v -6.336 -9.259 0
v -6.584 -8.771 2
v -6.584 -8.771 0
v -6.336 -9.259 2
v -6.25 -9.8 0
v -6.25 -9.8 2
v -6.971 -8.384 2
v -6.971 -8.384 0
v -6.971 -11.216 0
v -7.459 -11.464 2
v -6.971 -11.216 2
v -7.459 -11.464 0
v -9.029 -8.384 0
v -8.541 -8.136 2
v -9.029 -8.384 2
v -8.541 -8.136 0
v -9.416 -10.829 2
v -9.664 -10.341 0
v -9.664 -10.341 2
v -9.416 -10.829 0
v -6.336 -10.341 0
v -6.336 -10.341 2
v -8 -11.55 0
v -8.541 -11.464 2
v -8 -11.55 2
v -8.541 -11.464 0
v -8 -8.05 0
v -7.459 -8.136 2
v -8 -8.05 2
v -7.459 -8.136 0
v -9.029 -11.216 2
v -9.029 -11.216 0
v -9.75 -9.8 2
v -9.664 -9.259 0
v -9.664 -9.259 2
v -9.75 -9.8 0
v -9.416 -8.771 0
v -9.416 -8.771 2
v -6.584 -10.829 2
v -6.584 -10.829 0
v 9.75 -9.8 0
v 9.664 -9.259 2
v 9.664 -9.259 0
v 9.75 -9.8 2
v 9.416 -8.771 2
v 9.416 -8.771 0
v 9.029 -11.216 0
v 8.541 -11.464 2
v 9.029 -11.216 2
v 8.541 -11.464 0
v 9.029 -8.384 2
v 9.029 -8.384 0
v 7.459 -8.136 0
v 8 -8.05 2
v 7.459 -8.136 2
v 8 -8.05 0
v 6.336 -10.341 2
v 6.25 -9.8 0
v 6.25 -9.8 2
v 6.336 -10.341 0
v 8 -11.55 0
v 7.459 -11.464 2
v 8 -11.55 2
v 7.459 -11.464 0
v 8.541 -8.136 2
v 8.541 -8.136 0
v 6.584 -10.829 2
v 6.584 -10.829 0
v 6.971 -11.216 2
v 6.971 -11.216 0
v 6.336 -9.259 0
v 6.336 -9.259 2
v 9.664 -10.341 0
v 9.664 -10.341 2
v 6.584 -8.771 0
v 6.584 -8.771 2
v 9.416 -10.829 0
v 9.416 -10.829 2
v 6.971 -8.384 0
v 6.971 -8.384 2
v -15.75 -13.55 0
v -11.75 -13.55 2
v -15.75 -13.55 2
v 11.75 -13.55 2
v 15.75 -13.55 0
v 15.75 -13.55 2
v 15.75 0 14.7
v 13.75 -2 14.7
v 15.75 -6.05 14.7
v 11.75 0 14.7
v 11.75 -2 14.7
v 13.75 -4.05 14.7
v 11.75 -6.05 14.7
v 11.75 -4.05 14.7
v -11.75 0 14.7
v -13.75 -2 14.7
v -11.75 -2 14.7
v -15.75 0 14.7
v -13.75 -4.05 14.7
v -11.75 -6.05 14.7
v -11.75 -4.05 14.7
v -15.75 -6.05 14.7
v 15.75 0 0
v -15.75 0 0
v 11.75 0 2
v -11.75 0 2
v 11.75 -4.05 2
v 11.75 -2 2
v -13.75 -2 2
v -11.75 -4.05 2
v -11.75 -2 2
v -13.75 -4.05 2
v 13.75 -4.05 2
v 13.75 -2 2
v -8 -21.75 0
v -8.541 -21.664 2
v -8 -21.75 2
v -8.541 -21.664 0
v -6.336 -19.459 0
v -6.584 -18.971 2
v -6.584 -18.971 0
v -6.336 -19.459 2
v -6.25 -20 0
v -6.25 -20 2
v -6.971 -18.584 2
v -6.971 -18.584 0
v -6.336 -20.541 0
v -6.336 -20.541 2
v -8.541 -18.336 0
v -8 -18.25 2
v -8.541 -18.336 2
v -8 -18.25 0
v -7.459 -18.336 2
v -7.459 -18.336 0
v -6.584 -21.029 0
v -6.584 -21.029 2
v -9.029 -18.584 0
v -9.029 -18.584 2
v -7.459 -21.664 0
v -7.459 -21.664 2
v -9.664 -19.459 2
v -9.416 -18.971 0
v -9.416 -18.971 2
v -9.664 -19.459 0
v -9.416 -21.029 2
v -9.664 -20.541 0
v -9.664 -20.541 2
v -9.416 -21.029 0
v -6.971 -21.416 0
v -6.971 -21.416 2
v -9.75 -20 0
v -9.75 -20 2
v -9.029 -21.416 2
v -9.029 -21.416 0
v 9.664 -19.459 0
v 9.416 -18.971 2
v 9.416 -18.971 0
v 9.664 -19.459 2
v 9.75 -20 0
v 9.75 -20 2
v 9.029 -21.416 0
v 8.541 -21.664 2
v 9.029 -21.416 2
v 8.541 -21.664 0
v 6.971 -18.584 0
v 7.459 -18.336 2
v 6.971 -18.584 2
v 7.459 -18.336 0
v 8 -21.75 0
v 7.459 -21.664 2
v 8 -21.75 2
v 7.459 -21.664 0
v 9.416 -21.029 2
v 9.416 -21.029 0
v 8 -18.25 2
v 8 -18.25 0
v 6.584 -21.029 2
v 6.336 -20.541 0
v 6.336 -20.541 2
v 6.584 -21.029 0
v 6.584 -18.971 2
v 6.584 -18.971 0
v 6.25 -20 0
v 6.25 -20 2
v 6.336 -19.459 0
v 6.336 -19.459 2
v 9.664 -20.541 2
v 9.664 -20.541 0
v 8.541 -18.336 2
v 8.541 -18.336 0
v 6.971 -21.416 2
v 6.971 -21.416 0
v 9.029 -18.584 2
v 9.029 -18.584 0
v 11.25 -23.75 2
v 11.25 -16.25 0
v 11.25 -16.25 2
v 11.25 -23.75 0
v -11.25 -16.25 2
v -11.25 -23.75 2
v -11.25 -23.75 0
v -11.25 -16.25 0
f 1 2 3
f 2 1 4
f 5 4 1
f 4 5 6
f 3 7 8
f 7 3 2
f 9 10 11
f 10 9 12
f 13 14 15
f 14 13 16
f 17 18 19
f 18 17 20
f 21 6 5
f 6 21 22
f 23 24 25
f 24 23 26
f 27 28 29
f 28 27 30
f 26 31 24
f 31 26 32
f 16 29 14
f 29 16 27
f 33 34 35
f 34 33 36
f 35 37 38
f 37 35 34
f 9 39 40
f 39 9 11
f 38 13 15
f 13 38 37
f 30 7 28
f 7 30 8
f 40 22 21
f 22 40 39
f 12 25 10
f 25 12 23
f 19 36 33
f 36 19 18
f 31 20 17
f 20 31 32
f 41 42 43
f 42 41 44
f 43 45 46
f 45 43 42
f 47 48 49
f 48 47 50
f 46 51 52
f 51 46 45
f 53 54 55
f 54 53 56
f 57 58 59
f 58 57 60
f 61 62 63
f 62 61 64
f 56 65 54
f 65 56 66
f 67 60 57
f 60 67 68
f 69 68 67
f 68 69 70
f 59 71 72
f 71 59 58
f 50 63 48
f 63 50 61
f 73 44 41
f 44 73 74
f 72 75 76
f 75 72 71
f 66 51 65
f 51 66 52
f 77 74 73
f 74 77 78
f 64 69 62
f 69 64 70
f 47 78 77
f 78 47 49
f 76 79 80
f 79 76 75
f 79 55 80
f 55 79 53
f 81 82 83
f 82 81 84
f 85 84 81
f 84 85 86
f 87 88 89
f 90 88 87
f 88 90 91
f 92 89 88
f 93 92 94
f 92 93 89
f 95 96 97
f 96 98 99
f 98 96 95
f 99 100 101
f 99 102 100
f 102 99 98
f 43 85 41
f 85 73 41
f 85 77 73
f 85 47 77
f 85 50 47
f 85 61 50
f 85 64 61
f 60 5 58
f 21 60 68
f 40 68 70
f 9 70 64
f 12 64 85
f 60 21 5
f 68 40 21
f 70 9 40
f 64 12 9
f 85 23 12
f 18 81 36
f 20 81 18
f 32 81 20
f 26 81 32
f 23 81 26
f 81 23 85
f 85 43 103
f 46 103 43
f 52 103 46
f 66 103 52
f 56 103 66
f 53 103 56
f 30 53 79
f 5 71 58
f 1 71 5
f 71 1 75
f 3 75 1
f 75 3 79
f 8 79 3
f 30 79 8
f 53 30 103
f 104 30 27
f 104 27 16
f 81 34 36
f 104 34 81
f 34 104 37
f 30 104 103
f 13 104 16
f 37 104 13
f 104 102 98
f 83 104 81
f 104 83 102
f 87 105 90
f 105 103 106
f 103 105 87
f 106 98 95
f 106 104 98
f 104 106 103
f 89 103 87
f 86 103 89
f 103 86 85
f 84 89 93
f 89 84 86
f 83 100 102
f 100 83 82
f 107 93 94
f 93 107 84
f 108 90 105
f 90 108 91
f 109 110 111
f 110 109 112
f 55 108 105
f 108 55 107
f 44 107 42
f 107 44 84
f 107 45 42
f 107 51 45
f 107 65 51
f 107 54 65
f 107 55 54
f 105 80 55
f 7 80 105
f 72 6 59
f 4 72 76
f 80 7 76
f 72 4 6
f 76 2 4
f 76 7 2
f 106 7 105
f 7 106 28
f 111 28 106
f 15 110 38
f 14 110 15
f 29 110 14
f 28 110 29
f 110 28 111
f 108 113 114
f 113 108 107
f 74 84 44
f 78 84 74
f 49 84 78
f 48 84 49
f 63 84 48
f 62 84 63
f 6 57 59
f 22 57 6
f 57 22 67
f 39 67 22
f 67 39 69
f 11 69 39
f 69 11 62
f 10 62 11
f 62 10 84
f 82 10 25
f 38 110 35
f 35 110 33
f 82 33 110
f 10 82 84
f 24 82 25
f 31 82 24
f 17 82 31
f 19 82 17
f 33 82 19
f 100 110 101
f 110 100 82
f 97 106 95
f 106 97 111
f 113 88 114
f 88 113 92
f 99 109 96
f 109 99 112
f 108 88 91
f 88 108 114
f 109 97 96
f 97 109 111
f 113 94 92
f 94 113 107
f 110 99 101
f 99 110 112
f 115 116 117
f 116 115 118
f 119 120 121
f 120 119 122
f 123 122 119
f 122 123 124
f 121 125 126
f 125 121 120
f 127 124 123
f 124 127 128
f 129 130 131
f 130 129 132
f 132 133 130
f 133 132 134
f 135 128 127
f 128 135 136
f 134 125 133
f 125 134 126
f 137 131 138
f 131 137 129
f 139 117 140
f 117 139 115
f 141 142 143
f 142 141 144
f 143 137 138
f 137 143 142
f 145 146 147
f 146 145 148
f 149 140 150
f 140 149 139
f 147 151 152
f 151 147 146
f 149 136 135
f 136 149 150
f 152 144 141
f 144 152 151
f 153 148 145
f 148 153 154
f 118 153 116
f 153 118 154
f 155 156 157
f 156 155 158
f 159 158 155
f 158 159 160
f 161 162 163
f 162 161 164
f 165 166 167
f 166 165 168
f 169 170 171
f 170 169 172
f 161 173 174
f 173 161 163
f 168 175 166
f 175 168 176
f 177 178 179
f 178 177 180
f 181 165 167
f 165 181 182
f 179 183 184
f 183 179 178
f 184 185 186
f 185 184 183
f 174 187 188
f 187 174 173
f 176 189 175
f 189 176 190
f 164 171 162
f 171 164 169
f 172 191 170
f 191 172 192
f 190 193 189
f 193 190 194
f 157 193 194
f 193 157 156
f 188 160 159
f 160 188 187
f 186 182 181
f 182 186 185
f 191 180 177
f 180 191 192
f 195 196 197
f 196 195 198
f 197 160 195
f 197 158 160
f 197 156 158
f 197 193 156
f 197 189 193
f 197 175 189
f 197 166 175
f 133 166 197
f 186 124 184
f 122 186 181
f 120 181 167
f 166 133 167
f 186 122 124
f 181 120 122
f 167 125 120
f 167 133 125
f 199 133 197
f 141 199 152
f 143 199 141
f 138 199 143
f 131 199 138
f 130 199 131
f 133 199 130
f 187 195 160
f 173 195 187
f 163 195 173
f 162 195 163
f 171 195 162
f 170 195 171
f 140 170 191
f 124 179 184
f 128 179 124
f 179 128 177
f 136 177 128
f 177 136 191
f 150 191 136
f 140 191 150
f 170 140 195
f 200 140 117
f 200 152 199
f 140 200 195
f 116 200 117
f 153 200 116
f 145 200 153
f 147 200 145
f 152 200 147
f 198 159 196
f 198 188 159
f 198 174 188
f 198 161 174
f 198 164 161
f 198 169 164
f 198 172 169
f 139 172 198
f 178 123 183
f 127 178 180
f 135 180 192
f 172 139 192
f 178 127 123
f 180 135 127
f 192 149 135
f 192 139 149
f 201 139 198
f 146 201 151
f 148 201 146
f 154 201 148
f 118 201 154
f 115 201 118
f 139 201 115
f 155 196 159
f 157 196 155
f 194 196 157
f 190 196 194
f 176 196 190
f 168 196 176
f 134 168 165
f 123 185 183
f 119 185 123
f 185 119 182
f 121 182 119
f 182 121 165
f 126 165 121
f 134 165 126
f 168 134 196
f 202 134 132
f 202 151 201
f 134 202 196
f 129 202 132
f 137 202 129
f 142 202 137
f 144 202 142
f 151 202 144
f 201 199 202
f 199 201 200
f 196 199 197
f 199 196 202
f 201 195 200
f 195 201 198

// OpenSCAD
/*
 * Vertical PCB Mounting Bracket
 *
 * by Alex Franke (CodeCreations), Oct 2012
 * http://www.theFrankes.com
 * 
 * Licenced under Creative Commons Attribution - Non-Commercial - Share Alike 3.0 
 * 
 * DESCRIPTION: This little bracket provides an easy way to mount a PCB vertically. It includes
 *   a small wire clamp that can be used to hold PCB wires in place. I use it to hold a small 1"  
 *   by 0.5" PCB that has a bank of header pins for X, Y, Z, and E motors. 
 * 
 * INSTRUCTIONS: Set User-defined values, render, and print. Insert the PCB in the channel and 
 *   route the wires between the mounting holes. Place the wire clamp on top and mount using the 
 *   holes. You may need to tweak the values a bit for a snug fit. 
 * 
 * THING: http://www.thingiverse.com/thing:34308
 * 
 * v1.00, Jun 15, 2012: Initial version. 
 *
 */

/////////////////////////////////////////////////////////////////////////////
// User-defined values... 
/////////////////////////////////////////////////////////////////////////////

// Describe the PCB 
boardWidth       = 27.5;  // Width of the PCB or board to hold
boardThickness   = 2.05;  // Thickness of the PCB or board to hold
clipHeight       = 12.7;  // The height of the PCB or board to hold 

// Describe the bracket 
thickness        = 2;     // The thickness of the material surrounding the board 
baseThickness    = 2;     // The thickness of the base 
supportWidth     = 4;     // The overall width of the support risers
holeDiameter     = 3.5;   // The diameter of the holes 
holePadding      = 2;     // The distance between the edge of the hole other edges or walls

// Describe the wire clamp 
includeWireClamp = true;  // Whether or not to include the wire clamp 
play             = 1;     // The amount of play in the wire clamp

// Other parameters 
$fn              = 20;    // General circle quality. 


/////////////////////////////////////////////////////////////////////////////
// Some calculated values... 
/////////////////////////////////////////////////////////////////////////////

overallSize = [	boardWidth+thickness*2, 
				boardThickness+thickness*2+holeDiameter+holePadding*2, 
				baseThickness+clipHeight];

X=0;
Y=1;
Z=2;

/////////////////////////////////////////////////////////////////////////////
// The code... 
/////////////////////////////////////////////////////////////////////////////

difference() {
	translate([overallSize[X]/2,0,0]) 
		rotate([90,0,-90]) 
			linear_extrude(height=overallSize[X])
				polygon(points=[
					[0,0],
					[0,overallSize[Z]],
					[boardThickness+thickness*2,overallSize[Z]],
					[overallSize[1],baseThickness],
					[overallSize[1],0],
					[0,0]
				]);

	translate([0,-overallSize[Y]/2,overallSize[Z]/2+baseThickness])
		cube([overallSize[X]-supportWidth*2,overallSize[Y]+1,overallSize[Z]], center=true);

	translate([0,-boardThickness/2-thickness,clipHeight/2+baseThickness+0.5]) 
		cube([boardWidth,boardThickness,clipHeight+1], center=true);

	for(i=[-1,1]) 
		translate([	i*(overallSize[X]/2-supportWidth-holePadding-holeDiameter/2),
					-boardThickness-thickness*2-holePadding-holeDiameter/2,
					-0.5]) 
			cylinder(h=boardThickness+1, r=holeDiameter/2);

}

if ( includeWireClamp ) {
	translate([0,-20,thickness/2]) 
	difference() {
		cube([	overallSize[X]-supportWidth*2-play,
				holeDiameter+holePadding*2,
				thickness], center=true);
	
		for(i=[-1,1]) 
			translate([	i*(overallSize[X]/2-supportWidth-holePadding-holeDiameter/2),0,0]) 
				cylinder(h=boardThickness+1, r=holeDiameter/2, center=true);
	
	
	}
}
